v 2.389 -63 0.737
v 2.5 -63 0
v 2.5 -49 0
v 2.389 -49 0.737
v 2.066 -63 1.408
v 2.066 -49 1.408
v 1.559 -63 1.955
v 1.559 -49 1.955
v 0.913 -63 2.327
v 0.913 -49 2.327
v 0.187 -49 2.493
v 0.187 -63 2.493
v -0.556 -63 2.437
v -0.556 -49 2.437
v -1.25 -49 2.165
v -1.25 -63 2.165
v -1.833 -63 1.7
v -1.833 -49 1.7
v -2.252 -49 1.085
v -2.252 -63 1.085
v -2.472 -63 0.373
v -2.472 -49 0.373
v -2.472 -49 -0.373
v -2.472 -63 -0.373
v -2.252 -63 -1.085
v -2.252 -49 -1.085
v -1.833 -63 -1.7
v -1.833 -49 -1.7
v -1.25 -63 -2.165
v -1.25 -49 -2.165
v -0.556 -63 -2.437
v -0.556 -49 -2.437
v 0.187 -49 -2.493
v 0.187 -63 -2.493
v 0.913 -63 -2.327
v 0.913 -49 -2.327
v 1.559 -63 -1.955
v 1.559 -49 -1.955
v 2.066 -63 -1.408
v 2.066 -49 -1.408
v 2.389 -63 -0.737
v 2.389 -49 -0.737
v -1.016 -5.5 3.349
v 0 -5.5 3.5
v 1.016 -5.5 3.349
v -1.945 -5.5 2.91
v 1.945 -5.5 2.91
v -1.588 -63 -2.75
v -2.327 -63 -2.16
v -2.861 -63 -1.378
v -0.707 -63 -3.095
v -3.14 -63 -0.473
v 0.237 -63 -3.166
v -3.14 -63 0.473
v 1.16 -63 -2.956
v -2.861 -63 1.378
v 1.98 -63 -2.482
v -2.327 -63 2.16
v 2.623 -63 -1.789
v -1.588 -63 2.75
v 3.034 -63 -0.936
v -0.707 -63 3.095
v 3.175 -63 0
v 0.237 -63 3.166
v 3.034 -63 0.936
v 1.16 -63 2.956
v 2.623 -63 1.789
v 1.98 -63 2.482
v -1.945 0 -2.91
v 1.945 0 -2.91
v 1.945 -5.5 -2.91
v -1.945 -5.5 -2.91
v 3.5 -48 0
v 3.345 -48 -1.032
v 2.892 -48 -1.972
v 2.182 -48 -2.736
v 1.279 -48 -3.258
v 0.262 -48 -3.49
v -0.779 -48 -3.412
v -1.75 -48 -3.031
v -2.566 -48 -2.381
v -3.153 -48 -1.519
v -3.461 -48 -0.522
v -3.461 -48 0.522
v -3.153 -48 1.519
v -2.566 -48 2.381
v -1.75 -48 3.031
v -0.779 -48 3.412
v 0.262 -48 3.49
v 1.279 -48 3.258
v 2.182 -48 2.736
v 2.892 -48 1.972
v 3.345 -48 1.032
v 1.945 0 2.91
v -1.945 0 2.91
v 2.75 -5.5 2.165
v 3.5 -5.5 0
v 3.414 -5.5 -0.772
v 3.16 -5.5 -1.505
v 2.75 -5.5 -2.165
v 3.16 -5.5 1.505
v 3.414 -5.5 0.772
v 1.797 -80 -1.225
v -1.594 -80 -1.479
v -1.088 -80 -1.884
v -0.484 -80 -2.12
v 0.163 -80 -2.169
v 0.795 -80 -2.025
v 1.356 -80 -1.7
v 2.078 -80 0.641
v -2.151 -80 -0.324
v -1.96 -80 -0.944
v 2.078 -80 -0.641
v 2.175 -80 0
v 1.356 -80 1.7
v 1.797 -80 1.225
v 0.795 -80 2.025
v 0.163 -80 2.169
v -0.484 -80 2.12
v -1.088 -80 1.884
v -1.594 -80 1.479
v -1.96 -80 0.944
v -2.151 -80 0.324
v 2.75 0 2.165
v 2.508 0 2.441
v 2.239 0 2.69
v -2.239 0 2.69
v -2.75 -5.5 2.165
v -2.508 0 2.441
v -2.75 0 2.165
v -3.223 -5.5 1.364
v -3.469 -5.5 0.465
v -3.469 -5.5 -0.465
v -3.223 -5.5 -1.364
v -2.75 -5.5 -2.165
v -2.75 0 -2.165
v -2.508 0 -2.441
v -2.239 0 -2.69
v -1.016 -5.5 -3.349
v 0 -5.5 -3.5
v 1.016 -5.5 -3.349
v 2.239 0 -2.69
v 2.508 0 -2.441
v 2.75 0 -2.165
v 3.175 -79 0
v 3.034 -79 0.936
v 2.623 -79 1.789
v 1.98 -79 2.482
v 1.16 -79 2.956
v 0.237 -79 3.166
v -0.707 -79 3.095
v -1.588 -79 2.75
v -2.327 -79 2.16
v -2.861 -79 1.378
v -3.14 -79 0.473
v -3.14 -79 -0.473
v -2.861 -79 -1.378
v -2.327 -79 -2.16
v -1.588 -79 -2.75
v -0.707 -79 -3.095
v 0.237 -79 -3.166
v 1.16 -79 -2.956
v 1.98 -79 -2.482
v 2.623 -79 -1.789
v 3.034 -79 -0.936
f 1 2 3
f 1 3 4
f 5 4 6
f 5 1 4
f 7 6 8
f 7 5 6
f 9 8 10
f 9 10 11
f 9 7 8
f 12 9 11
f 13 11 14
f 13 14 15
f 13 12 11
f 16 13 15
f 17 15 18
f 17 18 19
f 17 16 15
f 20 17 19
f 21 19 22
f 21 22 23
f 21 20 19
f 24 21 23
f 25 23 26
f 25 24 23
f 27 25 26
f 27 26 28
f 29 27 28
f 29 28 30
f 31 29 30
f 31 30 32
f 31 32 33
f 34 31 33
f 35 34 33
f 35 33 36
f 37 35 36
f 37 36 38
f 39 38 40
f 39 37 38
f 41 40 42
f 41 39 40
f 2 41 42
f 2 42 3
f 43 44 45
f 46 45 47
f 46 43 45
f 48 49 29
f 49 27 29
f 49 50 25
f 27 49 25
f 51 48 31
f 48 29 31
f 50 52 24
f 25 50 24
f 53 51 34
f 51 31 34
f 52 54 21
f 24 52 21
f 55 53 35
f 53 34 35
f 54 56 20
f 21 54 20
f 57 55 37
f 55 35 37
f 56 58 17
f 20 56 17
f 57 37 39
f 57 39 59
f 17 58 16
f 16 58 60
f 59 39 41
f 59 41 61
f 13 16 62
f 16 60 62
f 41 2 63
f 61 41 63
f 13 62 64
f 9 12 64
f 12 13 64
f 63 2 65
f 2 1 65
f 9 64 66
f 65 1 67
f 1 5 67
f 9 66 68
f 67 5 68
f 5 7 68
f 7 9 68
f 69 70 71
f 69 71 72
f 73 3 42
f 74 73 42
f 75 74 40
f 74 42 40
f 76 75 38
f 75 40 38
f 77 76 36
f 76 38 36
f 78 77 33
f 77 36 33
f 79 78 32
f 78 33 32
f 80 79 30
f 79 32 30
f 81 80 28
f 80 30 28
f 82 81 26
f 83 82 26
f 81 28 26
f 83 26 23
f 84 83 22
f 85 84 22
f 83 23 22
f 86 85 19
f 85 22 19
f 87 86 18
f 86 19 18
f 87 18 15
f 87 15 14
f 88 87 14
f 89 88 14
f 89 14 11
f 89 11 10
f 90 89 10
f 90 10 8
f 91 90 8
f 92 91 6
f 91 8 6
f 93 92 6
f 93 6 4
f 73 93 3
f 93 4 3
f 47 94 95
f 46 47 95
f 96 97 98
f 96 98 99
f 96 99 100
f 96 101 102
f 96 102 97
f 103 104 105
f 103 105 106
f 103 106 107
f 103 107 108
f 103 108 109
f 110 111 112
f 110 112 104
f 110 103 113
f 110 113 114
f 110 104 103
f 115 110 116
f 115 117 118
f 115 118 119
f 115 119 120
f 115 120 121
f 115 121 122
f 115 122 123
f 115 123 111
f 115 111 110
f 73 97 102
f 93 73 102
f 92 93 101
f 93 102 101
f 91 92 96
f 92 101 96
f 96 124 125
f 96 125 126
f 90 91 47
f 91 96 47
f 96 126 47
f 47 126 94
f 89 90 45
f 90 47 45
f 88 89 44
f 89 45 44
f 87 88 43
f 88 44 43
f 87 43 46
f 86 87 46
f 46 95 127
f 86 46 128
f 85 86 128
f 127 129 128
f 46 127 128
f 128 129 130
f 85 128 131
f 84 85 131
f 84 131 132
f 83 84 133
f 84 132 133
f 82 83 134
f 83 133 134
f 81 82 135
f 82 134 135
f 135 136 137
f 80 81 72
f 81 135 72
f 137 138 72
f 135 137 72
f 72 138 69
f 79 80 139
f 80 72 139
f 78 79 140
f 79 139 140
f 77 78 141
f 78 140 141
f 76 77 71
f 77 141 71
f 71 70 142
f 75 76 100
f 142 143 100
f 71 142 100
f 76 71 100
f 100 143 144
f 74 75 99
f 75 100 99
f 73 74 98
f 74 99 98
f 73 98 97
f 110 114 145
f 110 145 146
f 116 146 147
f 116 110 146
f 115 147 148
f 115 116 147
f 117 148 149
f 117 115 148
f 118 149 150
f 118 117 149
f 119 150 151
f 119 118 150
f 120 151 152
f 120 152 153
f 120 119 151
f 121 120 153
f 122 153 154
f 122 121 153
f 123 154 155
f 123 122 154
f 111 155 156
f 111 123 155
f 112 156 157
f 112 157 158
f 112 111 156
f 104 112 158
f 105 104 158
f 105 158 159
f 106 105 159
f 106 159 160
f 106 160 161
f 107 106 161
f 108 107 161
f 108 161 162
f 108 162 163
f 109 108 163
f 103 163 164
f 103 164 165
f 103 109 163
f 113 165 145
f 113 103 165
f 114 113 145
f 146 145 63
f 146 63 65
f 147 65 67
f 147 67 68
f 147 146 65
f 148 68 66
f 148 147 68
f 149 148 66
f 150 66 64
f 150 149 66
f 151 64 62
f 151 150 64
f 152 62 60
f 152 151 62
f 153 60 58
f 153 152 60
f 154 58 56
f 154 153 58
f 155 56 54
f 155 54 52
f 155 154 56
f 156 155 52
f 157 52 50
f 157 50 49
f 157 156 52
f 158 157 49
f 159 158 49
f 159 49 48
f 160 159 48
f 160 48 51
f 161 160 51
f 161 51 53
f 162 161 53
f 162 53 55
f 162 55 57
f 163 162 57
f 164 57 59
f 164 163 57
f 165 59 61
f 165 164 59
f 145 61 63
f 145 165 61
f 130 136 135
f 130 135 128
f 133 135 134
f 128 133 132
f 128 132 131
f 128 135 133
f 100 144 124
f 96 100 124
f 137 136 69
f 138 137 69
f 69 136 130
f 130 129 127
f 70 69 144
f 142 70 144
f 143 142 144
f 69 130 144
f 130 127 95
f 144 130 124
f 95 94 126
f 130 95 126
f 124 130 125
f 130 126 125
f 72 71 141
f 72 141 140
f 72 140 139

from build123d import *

# Parameters (mm, degrees)
F0_R        = 3.5
F1_DEPTH    = 80
F2_R        = 6.3298520118
F2_R_2      = 2.5
F3_DEPTH    = 30
F4_S5_R     = 2.5
F4_T6_DEPTH = 7
F5_R        = 3.175
F6_DEPTH    = 17
F7_SIZE     = 1
F8_W        = 9.7203729674
F8_H        = 8.019306697
F8_W_2      = 5.5
F8_H_2      = 5.8197690165
F9_DEPTH    = 5.5


# Not quite as in the source:
# - a fillet or chamfer that OpenCascade refuses, or shapes differently, is made with other operations: its cross-section is extruded or revolved along the edge and cut away or added


with BuildPart() as f1:
    # F0 (on Front) → F1 (new body)
    with BuildSketch(Plane.XZ):
        Circle(F0_R)
    extrude(amount=F1_DEPTH)

    # F2 (on face) → F3 (cut)
    with BuildSketch(Plane.XZ.offset(80)):
        Circle(F2_R)
        Circle(F2_R_2, mode=Mode.SUBTRACT)
    extrude(amount=-F3_DEPTH, mode=Mode.SUBTRACT)

    # F4: chamfer of 2 on 1 edges, made by hand


with BuildPart() as f4_tool2:
    # F4_s3 → F4_t4 (revolve)
    with BuildSketch(Plane.XY):
        Polygon((3.5, -48), (1.5, -50), (3.5, -50), align=None)
    revolve(axis=Axis((0, -50, 0), (0, 1, 0)))

    # F4_s5 → F4_t6 (cut, symmetric)
    with BuildSketch(Plane.XZ.offset(49)):
        Circle(F4_S5_R)
    extrude(amount=F4_T6_DEPTH, both=True, mode=Mode.SUBTRACT)


with BuildPart() as f1_1:
    add(f1.part)

    # F4_t1: cut F4_tool2
    add(f4_tool2.part, mode=Mode.SUBTRACT)

    # F5 (on face) → F6 (join)
    with BuildSketch(Plane.XZ.offset(80)):
        Circle(F5_R)
    extrude(amount=-F6_DEPTH)

    # F7
    f7_edges = [f1_1.edges().sort_by_distance(p)[0] for p in [
        (-3.175, -80, 0),
    ]]
    chamfer(f7_edges, length=F7_SIZE)

    # F8 (on face) → F9 (cut)
    with BuildSketch(Plane(origin=(0, 0, 0), x_dir=(-1, 0, 0), z_dir=(0, 1, 0))):
        Rectangle(F8_W, F8_H)
        Rectangle(F8_W_2, F8_H_2, mode=Mode.SUBTRACT)
    extrude(amount=-F9_DEPTH, mode=Mode.SUBTRACT)


solid = f1_1.part
